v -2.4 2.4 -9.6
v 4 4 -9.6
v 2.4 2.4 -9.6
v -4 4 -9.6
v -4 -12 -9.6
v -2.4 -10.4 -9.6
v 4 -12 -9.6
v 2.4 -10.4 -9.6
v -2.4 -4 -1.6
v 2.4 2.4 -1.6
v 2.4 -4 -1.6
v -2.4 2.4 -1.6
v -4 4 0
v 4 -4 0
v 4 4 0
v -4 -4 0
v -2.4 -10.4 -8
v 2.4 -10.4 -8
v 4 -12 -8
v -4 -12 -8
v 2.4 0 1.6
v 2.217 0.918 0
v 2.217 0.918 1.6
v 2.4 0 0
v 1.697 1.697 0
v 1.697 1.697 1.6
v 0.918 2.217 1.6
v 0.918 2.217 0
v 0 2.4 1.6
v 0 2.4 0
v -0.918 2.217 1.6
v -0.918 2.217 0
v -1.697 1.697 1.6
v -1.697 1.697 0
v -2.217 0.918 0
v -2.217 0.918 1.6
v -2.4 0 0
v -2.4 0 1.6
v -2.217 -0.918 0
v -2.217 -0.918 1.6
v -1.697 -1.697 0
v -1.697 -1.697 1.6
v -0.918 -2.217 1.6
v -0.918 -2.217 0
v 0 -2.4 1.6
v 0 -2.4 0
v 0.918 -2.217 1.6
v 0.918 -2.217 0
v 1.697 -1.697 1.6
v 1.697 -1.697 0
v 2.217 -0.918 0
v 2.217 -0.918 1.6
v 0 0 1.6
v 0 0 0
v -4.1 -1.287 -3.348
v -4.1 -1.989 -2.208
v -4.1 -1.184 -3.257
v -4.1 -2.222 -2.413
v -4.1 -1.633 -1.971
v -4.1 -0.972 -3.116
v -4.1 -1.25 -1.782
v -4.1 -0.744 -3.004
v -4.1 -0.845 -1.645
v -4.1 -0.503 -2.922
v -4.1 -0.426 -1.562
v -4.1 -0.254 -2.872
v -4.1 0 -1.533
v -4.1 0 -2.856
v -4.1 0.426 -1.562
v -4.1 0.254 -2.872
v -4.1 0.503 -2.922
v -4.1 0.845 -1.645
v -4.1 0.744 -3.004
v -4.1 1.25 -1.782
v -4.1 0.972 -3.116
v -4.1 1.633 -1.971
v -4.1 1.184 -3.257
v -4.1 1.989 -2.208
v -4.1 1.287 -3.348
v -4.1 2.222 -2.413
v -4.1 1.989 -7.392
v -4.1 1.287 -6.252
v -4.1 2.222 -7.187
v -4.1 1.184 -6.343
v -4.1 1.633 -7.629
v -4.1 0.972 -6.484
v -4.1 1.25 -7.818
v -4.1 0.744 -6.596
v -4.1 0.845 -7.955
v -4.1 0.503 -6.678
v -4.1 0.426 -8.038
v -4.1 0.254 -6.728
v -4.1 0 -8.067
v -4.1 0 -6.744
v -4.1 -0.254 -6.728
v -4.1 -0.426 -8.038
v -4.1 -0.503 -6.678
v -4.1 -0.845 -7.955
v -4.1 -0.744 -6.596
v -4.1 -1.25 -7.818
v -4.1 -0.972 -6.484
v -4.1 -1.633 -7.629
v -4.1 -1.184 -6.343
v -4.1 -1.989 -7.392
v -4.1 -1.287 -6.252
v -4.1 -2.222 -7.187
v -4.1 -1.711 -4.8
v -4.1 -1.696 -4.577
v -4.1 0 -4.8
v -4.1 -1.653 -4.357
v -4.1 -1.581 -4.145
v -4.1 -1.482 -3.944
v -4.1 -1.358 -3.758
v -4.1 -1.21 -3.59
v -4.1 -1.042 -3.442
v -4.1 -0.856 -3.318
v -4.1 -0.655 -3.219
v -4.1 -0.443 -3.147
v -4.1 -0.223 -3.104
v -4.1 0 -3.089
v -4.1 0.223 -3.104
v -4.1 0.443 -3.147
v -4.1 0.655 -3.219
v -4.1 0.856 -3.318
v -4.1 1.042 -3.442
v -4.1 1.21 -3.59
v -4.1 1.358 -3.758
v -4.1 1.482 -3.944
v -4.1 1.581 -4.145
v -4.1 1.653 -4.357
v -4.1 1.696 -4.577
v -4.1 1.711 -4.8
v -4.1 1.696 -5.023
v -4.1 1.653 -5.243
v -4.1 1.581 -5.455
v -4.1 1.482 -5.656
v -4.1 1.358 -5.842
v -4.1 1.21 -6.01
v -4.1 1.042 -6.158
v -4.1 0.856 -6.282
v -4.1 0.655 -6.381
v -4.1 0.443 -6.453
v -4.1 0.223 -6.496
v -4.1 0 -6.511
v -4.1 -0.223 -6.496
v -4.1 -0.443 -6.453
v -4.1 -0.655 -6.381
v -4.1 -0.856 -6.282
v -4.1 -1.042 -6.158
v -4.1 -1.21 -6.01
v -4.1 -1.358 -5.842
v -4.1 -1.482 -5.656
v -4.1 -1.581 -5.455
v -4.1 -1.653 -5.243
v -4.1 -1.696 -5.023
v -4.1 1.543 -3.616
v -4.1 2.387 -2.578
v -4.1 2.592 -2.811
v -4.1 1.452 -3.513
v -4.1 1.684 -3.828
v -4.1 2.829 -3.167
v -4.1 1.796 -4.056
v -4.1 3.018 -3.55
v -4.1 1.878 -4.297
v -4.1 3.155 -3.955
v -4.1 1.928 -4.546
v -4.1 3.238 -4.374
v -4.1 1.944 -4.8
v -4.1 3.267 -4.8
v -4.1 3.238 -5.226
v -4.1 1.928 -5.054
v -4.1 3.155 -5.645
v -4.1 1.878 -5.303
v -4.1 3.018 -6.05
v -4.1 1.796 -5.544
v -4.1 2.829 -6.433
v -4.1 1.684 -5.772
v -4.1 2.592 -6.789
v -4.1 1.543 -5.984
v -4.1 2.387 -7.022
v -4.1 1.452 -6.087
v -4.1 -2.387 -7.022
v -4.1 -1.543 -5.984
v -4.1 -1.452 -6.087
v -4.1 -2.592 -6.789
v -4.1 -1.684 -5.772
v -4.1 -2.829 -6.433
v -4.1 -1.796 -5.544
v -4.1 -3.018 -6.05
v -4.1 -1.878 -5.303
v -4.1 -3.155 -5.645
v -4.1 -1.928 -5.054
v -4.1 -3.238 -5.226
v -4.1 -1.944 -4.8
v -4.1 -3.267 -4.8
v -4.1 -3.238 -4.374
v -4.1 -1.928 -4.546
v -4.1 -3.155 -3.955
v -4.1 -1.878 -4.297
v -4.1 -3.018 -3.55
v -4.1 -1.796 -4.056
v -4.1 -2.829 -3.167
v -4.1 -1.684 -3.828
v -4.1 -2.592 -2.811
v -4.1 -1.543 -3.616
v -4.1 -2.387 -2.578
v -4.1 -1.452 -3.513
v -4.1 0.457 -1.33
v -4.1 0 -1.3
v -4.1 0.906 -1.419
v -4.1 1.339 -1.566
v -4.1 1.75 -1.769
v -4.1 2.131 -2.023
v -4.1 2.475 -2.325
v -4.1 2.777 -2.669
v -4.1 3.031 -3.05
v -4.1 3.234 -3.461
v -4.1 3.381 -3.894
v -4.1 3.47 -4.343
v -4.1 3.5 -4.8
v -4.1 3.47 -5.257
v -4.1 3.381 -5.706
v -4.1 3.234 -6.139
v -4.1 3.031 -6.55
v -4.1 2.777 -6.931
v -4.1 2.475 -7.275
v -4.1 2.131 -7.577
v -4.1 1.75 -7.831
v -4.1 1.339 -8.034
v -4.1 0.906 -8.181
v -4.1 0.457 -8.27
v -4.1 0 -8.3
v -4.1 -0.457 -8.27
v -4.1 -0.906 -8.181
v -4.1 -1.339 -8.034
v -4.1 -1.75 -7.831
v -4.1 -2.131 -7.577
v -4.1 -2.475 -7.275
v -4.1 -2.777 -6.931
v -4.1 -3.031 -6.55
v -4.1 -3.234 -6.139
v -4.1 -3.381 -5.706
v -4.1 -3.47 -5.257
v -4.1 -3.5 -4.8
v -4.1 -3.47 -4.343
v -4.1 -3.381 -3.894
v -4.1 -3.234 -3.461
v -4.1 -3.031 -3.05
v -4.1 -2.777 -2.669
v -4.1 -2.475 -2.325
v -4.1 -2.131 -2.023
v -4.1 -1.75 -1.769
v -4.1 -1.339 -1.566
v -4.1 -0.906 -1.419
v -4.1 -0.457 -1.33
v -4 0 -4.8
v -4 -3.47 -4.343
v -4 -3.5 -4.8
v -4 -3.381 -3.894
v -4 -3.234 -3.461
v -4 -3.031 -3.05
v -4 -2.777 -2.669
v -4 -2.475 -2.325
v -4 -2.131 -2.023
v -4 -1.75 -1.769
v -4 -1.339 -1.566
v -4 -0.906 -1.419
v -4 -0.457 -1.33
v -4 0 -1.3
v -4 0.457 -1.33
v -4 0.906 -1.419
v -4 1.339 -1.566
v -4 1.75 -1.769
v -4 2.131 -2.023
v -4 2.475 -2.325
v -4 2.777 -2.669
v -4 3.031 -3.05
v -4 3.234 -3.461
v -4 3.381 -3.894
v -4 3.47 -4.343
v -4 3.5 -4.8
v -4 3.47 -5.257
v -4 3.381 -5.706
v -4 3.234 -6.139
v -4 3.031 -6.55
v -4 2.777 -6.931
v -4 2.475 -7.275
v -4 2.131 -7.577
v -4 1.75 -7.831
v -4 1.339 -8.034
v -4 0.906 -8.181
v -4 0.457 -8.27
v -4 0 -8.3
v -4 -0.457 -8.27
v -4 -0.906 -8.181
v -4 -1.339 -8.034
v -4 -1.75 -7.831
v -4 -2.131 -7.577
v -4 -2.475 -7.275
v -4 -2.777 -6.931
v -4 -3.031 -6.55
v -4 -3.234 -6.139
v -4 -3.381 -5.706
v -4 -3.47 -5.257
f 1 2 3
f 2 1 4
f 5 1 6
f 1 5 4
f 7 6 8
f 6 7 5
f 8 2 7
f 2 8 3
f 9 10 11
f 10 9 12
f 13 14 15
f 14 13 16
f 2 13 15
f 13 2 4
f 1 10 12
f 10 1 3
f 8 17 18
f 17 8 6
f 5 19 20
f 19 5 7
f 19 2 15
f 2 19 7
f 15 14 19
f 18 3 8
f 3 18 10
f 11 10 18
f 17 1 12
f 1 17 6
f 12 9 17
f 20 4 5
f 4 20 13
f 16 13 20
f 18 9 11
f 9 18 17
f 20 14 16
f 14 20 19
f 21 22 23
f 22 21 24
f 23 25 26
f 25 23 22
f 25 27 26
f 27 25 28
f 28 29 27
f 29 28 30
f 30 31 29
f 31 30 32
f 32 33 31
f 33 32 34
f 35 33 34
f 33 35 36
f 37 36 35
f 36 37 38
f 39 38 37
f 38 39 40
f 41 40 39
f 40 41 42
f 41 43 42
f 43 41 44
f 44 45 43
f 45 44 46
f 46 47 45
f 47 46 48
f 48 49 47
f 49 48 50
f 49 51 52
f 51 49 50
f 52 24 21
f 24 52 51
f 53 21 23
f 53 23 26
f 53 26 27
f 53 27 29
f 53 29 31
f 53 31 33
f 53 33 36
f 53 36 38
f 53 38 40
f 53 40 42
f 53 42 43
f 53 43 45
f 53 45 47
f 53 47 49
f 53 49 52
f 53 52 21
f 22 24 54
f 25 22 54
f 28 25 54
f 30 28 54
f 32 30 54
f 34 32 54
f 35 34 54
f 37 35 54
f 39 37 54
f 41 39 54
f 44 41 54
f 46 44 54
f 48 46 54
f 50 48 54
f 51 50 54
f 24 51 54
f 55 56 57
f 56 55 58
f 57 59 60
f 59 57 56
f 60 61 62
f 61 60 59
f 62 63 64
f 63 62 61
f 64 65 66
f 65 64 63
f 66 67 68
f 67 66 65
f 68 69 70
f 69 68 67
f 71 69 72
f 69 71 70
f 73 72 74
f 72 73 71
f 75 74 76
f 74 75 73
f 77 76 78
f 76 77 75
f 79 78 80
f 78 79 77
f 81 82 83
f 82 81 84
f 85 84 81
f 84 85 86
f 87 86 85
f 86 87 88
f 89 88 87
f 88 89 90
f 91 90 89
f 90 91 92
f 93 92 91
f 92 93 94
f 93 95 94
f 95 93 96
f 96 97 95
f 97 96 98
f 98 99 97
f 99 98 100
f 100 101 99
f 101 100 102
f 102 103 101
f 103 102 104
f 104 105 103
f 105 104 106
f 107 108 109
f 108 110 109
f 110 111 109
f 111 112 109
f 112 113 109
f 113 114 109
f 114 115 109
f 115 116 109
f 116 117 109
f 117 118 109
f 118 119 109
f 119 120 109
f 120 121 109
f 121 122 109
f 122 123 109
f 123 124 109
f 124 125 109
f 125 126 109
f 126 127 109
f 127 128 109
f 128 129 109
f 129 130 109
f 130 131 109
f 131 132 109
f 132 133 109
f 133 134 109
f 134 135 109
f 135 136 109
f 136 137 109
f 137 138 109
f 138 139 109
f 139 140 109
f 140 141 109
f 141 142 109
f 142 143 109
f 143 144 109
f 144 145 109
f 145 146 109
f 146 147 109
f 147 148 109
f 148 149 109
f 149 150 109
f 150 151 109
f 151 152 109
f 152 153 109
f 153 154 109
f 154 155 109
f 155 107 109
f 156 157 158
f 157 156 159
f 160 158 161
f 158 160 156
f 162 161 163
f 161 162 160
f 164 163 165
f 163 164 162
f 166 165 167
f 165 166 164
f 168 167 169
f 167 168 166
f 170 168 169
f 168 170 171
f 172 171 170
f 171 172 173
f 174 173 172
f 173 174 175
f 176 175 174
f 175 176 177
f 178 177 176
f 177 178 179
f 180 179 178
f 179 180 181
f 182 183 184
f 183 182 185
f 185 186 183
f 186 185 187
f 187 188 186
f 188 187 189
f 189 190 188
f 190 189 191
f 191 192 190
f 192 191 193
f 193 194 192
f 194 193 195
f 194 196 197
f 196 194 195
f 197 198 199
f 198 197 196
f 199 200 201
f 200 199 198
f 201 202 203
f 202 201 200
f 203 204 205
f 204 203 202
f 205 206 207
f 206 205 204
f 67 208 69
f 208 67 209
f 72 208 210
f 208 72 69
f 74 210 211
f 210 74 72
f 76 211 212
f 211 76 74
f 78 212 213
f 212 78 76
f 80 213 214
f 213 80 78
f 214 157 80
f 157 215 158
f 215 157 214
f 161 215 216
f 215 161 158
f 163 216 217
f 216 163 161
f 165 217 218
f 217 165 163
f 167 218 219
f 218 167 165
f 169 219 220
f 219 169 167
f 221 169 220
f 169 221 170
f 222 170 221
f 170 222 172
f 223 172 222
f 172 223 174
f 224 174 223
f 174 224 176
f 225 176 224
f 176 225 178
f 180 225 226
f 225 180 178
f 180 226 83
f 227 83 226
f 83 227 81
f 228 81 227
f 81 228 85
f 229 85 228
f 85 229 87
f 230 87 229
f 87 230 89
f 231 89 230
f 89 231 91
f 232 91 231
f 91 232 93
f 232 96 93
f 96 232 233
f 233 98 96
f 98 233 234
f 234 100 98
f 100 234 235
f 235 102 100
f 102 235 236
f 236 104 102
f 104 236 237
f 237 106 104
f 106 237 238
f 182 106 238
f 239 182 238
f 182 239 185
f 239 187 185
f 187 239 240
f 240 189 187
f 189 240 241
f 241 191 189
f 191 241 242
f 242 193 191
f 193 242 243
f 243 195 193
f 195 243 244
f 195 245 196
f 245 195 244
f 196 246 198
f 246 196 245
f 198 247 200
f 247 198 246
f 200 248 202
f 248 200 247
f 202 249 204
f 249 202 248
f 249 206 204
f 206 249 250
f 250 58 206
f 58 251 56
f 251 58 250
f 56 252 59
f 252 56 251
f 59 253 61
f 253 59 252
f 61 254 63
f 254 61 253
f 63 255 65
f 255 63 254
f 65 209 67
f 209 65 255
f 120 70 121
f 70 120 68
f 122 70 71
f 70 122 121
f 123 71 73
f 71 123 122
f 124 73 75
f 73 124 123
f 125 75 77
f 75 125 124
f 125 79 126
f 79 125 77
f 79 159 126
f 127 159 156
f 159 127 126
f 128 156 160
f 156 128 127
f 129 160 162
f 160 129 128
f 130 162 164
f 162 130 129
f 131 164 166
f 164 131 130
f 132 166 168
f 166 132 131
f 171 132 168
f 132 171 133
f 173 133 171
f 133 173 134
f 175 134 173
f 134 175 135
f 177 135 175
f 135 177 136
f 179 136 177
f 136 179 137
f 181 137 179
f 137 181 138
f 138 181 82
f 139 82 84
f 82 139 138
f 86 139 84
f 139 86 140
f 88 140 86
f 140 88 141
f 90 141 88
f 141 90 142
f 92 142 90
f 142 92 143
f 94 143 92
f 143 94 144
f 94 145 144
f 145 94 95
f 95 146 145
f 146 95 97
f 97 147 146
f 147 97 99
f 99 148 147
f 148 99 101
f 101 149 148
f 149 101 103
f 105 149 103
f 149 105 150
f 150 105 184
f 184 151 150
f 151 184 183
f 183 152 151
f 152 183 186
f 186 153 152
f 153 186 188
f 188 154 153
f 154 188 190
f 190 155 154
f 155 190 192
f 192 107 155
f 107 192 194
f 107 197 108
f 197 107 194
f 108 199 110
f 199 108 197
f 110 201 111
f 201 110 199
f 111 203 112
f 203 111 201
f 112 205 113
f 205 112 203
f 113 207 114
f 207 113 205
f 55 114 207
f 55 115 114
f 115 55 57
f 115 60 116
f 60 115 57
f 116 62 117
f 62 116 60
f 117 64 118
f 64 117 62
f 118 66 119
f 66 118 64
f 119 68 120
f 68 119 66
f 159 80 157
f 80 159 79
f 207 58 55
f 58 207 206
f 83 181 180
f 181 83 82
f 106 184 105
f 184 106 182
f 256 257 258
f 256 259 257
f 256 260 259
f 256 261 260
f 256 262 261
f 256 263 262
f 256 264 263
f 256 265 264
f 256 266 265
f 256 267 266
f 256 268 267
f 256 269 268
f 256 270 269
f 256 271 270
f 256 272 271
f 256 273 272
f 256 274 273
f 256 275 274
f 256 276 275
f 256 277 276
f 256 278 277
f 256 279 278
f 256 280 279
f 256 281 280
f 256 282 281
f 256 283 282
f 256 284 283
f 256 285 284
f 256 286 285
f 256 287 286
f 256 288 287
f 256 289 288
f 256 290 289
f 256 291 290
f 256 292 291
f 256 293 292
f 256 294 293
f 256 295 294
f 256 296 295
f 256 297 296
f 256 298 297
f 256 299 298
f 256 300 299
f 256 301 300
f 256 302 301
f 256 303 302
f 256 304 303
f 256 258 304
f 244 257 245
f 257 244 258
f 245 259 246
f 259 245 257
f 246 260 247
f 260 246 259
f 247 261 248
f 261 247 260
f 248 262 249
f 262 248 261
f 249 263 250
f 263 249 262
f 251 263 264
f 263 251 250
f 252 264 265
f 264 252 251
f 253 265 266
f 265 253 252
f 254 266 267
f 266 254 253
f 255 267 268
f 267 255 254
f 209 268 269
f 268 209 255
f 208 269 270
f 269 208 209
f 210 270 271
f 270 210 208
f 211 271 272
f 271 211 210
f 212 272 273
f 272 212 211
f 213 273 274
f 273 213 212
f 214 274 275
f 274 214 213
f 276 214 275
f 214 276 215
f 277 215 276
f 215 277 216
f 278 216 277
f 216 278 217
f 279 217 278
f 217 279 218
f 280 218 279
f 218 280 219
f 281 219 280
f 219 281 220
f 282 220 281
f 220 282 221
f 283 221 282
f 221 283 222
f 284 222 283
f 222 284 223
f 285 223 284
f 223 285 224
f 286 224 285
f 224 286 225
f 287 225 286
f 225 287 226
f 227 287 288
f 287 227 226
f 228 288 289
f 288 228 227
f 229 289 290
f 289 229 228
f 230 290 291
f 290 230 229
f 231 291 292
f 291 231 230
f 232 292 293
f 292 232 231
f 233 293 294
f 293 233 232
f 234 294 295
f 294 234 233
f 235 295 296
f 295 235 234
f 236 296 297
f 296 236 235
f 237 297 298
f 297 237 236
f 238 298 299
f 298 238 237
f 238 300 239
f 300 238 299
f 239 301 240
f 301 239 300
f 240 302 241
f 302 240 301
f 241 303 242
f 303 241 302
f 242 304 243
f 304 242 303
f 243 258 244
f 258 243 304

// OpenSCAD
use <../lib.scad>
use <003605e.scad>
use <3040a.scad>
function ldraw_lib__3040ad01() = [
// 0 Slope Brick 45  1 x  2 with Life Preserver Left Sticker
// 0 Name: 3040ad01.dat
// 0 Author: Takeshi Takahashi [RainbowDolphin]
// 0 !LDRAW_ORG Shortcut UPDATE 2024-08
// 0 !LICENSE Licensed under CC BY 4.0 : see CAreadme.txt
// 
// 0 BFC CERTIFY CCW
  [0,"BFC","CERTIFY"],
  [0,"BFC","CCW"],
// 
// 0 !CATEGORY Sticker Shortcut
// 0 !KEYWORDS Bricklink 3040apb01L, Fuel tanker, set 373-1
// 
// 0 !HISTORY 2024-09-30 [OrionP] Official Update 2024-08
// 
// 1 16 0 0 0 1 0 0 0 1 0 0 0 1 3040a.dat
  [1,16,0,0,0,1,0,0,0,1,0,0,0,1, ldraw_lib__3040a()],
// 0 // 1 16 10 12 0 0 -1 0 0 0 -1 1 0 0 003605e.dat
// 1 16 -10 12 0 0 1 0 0 0 -1 -1 0 0 003605e.dat
  [1,16,-10,12,0,0,1,0,0,0,-1,-1,0,0, ldraw_lib__003605e()],
];
module ldraw_lib__3040ad01(step=0, col=false, unit=2/5, alt=false, line=0.2, solid=!$preview)
    makepoly(ldraw_lib__3040ad01(), step=step, col=col, unit=unit, alt=alt, line=line, solid=solid);
ldraw_lib__3040ad01(line=0.2);
